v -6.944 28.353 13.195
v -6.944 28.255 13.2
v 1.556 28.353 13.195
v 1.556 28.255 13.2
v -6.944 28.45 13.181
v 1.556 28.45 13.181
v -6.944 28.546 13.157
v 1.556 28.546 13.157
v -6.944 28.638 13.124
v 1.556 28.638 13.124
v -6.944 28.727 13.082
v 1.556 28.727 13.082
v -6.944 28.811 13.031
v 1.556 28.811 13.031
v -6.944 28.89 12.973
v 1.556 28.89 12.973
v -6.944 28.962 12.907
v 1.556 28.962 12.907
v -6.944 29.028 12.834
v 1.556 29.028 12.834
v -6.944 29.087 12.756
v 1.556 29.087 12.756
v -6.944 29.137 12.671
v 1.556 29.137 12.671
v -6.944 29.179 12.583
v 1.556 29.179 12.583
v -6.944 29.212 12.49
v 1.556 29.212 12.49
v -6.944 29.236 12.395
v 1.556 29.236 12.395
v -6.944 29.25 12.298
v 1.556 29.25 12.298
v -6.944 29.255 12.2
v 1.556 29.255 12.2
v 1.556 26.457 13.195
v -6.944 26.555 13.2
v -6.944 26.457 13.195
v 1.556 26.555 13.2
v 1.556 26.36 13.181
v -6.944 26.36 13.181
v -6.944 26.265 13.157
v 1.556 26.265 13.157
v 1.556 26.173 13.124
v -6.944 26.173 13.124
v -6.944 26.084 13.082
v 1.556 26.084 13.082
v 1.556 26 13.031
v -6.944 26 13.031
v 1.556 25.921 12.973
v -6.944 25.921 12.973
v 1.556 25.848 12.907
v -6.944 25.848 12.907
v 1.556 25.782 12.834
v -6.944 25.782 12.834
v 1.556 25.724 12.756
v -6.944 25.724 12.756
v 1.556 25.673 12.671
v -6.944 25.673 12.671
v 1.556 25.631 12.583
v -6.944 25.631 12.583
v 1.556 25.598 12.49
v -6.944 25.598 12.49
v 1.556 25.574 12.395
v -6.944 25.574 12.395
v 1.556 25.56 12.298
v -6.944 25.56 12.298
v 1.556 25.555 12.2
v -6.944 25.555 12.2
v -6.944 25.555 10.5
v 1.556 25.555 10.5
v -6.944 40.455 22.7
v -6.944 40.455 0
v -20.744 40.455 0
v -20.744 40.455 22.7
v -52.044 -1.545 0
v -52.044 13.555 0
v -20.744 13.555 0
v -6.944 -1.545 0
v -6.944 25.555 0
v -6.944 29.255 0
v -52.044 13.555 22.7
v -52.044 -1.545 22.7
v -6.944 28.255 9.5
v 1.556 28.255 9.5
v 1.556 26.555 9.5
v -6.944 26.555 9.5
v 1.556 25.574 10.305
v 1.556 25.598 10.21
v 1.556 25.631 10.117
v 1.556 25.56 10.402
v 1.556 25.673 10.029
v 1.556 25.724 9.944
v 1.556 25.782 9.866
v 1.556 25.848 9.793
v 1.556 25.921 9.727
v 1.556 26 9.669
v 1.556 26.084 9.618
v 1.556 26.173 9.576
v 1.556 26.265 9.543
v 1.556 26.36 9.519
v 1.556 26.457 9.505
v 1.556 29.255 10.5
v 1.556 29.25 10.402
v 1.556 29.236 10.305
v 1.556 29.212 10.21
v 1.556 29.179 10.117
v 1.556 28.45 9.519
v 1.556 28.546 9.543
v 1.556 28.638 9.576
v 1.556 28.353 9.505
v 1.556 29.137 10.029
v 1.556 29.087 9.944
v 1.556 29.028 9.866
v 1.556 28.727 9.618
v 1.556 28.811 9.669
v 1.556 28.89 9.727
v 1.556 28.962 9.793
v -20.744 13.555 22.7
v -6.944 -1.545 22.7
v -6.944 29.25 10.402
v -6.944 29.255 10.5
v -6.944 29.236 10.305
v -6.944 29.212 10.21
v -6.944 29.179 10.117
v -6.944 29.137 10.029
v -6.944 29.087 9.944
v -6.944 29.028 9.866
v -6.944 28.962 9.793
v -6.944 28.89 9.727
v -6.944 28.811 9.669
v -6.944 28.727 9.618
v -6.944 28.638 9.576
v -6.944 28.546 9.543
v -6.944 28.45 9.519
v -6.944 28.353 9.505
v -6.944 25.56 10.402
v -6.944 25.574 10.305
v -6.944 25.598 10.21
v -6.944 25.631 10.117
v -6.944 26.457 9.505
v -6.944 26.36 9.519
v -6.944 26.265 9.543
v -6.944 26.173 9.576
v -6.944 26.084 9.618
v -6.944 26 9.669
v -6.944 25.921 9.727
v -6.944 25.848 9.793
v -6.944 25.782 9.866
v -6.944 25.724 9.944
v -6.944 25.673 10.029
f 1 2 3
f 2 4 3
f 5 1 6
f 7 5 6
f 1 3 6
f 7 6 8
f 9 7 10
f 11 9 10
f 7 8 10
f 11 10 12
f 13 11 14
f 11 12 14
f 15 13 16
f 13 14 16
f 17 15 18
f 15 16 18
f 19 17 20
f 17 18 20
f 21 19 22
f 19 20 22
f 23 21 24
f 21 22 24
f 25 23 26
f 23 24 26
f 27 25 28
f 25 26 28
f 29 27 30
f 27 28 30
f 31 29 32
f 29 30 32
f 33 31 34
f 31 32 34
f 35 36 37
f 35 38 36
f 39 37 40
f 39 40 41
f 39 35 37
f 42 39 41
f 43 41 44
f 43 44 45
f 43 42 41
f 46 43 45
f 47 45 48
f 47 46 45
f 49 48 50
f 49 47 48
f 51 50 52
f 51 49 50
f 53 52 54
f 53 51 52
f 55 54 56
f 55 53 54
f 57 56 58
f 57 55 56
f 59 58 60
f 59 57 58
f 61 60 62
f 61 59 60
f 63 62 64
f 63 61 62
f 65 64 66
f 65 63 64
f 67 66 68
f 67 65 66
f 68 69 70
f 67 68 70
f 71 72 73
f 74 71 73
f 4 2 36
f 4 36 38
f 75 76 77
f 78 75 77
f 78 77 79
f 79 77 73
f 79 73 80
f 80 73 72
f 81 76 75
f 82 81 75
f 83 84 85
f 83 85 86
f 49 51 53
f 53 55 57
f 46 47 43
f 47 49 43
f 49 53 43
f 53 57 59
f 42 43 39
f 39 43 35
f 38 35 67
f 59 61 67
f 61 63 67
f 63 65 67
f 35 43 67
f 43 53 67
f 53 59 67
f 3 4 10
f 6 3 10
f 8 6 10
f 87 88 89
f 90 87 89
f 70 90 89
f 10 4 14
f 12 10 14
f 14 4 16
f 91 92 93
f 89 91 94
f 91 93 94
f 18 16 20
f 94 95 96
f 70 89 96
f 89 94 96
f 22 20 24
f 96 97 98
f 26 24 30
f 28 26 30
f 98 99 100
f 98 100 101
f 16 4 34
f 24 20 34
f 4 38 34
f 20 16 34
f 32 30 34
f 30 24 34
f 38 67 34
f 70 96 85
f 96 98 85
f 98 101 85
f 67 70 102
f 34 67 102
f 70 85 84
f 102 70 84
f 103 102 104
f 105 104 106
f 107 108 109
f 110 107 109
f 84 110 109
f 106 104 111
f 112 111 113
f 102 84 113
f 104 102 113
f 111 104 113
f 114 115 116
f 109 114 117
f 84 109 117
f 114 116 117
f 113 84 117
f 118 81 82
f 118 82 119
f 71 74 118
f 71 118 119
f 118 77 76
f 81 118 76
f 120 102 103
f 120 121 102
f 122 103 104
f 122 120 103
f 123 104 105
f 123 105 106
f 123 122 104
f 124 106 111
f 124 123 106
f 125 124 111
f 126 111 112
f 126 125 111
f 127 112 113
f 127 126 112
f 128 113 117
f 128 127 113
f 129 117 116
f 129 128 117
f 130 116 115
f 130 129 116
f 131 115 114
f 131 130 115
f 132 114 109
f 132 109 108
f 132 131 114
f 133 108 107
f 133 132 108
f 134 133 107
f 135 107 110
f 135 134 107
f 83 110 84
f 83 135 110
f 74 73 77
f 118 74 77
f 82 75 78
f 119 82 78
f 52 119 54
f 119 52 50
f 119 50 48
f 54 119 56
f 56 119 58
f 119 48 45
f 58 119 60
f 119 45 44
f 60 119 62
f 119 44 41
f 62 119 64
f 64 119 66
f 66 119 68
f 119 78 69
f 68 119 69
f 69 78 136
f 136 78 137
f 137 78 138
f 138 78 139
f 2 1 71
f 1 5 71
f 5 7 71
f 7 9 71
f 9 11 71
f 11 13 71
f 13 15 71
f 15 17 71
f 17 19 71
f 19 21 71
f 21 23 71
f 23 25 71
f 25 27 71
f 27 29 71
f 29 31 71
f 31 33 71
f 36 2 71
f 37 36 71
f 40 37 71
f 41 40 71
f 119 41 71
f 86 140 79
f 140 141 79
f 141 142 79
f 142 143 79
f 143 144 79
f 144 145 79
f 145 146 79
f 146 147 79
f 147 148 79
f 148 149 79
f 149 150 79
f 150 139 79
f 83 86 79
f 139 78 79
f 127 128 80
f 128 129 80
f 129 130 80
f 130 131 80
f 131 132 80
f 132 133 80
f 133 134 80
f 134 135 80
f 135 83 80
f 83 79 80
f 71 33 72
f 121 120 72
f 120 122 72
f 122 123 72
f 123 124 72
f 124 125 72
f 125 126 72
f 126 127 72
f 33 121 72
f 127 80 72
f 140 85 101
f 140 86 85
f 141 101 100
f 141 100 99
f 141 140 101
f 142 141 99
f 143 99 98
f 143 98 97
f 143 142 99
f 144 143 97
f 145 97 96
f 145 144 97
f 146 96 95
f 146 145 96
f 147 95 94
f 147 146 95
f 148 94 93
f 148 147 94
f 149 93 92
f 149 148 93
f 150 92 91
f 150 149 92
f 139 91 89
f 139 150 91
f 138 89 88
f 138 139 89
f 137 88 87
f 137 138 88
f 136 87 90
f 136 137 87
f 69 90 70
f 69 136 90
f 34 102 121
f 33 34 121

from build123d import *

# Parameters (mm, degrees)
RESSALTO_EXTRUS_O1_DEPTH = 22.7
ESBO_O2_W                = 8.5
ESBO_O2_H                = 3.7
CORTE_EXTRUS_O1_DEPTH    = 9.5
ESBO_O3_W                = 8.527883753
ESBO_O3_H                = 4.058843418
CORTE_EXTRUS_O2_DEPTH    = 9.5
FILETE4_R                = 1


with BuildPart() as part:
    # Esboço1 → Ressalto-extrusão1 (new body)
    with BuildSketch(Plane.XY):
        Polygon((-52.043977441, 13.555253824), (-52.043977441, -1.544746176), (-6.943977441, -1.544746176), (-6.943977441, 25.555253824), (1.556022559, 25.555253824), (1.556022559, 29.255253824), (-6.943977441, 29.255253824), (-6.943977441, 40.455253824), (-20.743977441, 40.455253824), (-20.743977441, 13.555253824), align=None)
    extrude(amount=RESSALTO_EXTRUS_O1_DEPTH)

    # Esboço2 → Corte-extrusão1 (cut)
    with BuildSketch(Plane.XY.offset(22.7)):
        with Locations((-2.693977441, 27.405253824)):
            Rectangle(ESBO_O2_W, ESBO_O2_H)
    extrude(amount=-CORTE_EXTRUS_O1_DEPTH, mode=Mode.SUBTRACT)

    # Esboço3 → Corte-extrusão2 (cut)
    with BuildSketch(Plane(origin=(0, 0, 0), x_dir=(-1, 0, 0), z_dir=(0, 0, -1))):
        with Locations((2.680035565, 27.225832115)):
            Rectangle(ESBO_O3_W, ESBO_O3_H)
    extrude(amount=-CORTE_EXTRUS_O2_DEPTH, mode=Mode.SUBTRACT)

    # Filete4
    filete4_edges = [part.edges().sort_by_distance(p)[0] for p in [
        (-2.693977441, 29.255253824, 13.2),
        (-2.693977441, 25.555253824, 13.2),
        (-2.693977441, 25.555253824, 9.5),
        (-2.693977441, 29.255253824, 9.5),
    ]]
    fillet(filete4_edges, radius=FILETE4_R)


solid = part.part
